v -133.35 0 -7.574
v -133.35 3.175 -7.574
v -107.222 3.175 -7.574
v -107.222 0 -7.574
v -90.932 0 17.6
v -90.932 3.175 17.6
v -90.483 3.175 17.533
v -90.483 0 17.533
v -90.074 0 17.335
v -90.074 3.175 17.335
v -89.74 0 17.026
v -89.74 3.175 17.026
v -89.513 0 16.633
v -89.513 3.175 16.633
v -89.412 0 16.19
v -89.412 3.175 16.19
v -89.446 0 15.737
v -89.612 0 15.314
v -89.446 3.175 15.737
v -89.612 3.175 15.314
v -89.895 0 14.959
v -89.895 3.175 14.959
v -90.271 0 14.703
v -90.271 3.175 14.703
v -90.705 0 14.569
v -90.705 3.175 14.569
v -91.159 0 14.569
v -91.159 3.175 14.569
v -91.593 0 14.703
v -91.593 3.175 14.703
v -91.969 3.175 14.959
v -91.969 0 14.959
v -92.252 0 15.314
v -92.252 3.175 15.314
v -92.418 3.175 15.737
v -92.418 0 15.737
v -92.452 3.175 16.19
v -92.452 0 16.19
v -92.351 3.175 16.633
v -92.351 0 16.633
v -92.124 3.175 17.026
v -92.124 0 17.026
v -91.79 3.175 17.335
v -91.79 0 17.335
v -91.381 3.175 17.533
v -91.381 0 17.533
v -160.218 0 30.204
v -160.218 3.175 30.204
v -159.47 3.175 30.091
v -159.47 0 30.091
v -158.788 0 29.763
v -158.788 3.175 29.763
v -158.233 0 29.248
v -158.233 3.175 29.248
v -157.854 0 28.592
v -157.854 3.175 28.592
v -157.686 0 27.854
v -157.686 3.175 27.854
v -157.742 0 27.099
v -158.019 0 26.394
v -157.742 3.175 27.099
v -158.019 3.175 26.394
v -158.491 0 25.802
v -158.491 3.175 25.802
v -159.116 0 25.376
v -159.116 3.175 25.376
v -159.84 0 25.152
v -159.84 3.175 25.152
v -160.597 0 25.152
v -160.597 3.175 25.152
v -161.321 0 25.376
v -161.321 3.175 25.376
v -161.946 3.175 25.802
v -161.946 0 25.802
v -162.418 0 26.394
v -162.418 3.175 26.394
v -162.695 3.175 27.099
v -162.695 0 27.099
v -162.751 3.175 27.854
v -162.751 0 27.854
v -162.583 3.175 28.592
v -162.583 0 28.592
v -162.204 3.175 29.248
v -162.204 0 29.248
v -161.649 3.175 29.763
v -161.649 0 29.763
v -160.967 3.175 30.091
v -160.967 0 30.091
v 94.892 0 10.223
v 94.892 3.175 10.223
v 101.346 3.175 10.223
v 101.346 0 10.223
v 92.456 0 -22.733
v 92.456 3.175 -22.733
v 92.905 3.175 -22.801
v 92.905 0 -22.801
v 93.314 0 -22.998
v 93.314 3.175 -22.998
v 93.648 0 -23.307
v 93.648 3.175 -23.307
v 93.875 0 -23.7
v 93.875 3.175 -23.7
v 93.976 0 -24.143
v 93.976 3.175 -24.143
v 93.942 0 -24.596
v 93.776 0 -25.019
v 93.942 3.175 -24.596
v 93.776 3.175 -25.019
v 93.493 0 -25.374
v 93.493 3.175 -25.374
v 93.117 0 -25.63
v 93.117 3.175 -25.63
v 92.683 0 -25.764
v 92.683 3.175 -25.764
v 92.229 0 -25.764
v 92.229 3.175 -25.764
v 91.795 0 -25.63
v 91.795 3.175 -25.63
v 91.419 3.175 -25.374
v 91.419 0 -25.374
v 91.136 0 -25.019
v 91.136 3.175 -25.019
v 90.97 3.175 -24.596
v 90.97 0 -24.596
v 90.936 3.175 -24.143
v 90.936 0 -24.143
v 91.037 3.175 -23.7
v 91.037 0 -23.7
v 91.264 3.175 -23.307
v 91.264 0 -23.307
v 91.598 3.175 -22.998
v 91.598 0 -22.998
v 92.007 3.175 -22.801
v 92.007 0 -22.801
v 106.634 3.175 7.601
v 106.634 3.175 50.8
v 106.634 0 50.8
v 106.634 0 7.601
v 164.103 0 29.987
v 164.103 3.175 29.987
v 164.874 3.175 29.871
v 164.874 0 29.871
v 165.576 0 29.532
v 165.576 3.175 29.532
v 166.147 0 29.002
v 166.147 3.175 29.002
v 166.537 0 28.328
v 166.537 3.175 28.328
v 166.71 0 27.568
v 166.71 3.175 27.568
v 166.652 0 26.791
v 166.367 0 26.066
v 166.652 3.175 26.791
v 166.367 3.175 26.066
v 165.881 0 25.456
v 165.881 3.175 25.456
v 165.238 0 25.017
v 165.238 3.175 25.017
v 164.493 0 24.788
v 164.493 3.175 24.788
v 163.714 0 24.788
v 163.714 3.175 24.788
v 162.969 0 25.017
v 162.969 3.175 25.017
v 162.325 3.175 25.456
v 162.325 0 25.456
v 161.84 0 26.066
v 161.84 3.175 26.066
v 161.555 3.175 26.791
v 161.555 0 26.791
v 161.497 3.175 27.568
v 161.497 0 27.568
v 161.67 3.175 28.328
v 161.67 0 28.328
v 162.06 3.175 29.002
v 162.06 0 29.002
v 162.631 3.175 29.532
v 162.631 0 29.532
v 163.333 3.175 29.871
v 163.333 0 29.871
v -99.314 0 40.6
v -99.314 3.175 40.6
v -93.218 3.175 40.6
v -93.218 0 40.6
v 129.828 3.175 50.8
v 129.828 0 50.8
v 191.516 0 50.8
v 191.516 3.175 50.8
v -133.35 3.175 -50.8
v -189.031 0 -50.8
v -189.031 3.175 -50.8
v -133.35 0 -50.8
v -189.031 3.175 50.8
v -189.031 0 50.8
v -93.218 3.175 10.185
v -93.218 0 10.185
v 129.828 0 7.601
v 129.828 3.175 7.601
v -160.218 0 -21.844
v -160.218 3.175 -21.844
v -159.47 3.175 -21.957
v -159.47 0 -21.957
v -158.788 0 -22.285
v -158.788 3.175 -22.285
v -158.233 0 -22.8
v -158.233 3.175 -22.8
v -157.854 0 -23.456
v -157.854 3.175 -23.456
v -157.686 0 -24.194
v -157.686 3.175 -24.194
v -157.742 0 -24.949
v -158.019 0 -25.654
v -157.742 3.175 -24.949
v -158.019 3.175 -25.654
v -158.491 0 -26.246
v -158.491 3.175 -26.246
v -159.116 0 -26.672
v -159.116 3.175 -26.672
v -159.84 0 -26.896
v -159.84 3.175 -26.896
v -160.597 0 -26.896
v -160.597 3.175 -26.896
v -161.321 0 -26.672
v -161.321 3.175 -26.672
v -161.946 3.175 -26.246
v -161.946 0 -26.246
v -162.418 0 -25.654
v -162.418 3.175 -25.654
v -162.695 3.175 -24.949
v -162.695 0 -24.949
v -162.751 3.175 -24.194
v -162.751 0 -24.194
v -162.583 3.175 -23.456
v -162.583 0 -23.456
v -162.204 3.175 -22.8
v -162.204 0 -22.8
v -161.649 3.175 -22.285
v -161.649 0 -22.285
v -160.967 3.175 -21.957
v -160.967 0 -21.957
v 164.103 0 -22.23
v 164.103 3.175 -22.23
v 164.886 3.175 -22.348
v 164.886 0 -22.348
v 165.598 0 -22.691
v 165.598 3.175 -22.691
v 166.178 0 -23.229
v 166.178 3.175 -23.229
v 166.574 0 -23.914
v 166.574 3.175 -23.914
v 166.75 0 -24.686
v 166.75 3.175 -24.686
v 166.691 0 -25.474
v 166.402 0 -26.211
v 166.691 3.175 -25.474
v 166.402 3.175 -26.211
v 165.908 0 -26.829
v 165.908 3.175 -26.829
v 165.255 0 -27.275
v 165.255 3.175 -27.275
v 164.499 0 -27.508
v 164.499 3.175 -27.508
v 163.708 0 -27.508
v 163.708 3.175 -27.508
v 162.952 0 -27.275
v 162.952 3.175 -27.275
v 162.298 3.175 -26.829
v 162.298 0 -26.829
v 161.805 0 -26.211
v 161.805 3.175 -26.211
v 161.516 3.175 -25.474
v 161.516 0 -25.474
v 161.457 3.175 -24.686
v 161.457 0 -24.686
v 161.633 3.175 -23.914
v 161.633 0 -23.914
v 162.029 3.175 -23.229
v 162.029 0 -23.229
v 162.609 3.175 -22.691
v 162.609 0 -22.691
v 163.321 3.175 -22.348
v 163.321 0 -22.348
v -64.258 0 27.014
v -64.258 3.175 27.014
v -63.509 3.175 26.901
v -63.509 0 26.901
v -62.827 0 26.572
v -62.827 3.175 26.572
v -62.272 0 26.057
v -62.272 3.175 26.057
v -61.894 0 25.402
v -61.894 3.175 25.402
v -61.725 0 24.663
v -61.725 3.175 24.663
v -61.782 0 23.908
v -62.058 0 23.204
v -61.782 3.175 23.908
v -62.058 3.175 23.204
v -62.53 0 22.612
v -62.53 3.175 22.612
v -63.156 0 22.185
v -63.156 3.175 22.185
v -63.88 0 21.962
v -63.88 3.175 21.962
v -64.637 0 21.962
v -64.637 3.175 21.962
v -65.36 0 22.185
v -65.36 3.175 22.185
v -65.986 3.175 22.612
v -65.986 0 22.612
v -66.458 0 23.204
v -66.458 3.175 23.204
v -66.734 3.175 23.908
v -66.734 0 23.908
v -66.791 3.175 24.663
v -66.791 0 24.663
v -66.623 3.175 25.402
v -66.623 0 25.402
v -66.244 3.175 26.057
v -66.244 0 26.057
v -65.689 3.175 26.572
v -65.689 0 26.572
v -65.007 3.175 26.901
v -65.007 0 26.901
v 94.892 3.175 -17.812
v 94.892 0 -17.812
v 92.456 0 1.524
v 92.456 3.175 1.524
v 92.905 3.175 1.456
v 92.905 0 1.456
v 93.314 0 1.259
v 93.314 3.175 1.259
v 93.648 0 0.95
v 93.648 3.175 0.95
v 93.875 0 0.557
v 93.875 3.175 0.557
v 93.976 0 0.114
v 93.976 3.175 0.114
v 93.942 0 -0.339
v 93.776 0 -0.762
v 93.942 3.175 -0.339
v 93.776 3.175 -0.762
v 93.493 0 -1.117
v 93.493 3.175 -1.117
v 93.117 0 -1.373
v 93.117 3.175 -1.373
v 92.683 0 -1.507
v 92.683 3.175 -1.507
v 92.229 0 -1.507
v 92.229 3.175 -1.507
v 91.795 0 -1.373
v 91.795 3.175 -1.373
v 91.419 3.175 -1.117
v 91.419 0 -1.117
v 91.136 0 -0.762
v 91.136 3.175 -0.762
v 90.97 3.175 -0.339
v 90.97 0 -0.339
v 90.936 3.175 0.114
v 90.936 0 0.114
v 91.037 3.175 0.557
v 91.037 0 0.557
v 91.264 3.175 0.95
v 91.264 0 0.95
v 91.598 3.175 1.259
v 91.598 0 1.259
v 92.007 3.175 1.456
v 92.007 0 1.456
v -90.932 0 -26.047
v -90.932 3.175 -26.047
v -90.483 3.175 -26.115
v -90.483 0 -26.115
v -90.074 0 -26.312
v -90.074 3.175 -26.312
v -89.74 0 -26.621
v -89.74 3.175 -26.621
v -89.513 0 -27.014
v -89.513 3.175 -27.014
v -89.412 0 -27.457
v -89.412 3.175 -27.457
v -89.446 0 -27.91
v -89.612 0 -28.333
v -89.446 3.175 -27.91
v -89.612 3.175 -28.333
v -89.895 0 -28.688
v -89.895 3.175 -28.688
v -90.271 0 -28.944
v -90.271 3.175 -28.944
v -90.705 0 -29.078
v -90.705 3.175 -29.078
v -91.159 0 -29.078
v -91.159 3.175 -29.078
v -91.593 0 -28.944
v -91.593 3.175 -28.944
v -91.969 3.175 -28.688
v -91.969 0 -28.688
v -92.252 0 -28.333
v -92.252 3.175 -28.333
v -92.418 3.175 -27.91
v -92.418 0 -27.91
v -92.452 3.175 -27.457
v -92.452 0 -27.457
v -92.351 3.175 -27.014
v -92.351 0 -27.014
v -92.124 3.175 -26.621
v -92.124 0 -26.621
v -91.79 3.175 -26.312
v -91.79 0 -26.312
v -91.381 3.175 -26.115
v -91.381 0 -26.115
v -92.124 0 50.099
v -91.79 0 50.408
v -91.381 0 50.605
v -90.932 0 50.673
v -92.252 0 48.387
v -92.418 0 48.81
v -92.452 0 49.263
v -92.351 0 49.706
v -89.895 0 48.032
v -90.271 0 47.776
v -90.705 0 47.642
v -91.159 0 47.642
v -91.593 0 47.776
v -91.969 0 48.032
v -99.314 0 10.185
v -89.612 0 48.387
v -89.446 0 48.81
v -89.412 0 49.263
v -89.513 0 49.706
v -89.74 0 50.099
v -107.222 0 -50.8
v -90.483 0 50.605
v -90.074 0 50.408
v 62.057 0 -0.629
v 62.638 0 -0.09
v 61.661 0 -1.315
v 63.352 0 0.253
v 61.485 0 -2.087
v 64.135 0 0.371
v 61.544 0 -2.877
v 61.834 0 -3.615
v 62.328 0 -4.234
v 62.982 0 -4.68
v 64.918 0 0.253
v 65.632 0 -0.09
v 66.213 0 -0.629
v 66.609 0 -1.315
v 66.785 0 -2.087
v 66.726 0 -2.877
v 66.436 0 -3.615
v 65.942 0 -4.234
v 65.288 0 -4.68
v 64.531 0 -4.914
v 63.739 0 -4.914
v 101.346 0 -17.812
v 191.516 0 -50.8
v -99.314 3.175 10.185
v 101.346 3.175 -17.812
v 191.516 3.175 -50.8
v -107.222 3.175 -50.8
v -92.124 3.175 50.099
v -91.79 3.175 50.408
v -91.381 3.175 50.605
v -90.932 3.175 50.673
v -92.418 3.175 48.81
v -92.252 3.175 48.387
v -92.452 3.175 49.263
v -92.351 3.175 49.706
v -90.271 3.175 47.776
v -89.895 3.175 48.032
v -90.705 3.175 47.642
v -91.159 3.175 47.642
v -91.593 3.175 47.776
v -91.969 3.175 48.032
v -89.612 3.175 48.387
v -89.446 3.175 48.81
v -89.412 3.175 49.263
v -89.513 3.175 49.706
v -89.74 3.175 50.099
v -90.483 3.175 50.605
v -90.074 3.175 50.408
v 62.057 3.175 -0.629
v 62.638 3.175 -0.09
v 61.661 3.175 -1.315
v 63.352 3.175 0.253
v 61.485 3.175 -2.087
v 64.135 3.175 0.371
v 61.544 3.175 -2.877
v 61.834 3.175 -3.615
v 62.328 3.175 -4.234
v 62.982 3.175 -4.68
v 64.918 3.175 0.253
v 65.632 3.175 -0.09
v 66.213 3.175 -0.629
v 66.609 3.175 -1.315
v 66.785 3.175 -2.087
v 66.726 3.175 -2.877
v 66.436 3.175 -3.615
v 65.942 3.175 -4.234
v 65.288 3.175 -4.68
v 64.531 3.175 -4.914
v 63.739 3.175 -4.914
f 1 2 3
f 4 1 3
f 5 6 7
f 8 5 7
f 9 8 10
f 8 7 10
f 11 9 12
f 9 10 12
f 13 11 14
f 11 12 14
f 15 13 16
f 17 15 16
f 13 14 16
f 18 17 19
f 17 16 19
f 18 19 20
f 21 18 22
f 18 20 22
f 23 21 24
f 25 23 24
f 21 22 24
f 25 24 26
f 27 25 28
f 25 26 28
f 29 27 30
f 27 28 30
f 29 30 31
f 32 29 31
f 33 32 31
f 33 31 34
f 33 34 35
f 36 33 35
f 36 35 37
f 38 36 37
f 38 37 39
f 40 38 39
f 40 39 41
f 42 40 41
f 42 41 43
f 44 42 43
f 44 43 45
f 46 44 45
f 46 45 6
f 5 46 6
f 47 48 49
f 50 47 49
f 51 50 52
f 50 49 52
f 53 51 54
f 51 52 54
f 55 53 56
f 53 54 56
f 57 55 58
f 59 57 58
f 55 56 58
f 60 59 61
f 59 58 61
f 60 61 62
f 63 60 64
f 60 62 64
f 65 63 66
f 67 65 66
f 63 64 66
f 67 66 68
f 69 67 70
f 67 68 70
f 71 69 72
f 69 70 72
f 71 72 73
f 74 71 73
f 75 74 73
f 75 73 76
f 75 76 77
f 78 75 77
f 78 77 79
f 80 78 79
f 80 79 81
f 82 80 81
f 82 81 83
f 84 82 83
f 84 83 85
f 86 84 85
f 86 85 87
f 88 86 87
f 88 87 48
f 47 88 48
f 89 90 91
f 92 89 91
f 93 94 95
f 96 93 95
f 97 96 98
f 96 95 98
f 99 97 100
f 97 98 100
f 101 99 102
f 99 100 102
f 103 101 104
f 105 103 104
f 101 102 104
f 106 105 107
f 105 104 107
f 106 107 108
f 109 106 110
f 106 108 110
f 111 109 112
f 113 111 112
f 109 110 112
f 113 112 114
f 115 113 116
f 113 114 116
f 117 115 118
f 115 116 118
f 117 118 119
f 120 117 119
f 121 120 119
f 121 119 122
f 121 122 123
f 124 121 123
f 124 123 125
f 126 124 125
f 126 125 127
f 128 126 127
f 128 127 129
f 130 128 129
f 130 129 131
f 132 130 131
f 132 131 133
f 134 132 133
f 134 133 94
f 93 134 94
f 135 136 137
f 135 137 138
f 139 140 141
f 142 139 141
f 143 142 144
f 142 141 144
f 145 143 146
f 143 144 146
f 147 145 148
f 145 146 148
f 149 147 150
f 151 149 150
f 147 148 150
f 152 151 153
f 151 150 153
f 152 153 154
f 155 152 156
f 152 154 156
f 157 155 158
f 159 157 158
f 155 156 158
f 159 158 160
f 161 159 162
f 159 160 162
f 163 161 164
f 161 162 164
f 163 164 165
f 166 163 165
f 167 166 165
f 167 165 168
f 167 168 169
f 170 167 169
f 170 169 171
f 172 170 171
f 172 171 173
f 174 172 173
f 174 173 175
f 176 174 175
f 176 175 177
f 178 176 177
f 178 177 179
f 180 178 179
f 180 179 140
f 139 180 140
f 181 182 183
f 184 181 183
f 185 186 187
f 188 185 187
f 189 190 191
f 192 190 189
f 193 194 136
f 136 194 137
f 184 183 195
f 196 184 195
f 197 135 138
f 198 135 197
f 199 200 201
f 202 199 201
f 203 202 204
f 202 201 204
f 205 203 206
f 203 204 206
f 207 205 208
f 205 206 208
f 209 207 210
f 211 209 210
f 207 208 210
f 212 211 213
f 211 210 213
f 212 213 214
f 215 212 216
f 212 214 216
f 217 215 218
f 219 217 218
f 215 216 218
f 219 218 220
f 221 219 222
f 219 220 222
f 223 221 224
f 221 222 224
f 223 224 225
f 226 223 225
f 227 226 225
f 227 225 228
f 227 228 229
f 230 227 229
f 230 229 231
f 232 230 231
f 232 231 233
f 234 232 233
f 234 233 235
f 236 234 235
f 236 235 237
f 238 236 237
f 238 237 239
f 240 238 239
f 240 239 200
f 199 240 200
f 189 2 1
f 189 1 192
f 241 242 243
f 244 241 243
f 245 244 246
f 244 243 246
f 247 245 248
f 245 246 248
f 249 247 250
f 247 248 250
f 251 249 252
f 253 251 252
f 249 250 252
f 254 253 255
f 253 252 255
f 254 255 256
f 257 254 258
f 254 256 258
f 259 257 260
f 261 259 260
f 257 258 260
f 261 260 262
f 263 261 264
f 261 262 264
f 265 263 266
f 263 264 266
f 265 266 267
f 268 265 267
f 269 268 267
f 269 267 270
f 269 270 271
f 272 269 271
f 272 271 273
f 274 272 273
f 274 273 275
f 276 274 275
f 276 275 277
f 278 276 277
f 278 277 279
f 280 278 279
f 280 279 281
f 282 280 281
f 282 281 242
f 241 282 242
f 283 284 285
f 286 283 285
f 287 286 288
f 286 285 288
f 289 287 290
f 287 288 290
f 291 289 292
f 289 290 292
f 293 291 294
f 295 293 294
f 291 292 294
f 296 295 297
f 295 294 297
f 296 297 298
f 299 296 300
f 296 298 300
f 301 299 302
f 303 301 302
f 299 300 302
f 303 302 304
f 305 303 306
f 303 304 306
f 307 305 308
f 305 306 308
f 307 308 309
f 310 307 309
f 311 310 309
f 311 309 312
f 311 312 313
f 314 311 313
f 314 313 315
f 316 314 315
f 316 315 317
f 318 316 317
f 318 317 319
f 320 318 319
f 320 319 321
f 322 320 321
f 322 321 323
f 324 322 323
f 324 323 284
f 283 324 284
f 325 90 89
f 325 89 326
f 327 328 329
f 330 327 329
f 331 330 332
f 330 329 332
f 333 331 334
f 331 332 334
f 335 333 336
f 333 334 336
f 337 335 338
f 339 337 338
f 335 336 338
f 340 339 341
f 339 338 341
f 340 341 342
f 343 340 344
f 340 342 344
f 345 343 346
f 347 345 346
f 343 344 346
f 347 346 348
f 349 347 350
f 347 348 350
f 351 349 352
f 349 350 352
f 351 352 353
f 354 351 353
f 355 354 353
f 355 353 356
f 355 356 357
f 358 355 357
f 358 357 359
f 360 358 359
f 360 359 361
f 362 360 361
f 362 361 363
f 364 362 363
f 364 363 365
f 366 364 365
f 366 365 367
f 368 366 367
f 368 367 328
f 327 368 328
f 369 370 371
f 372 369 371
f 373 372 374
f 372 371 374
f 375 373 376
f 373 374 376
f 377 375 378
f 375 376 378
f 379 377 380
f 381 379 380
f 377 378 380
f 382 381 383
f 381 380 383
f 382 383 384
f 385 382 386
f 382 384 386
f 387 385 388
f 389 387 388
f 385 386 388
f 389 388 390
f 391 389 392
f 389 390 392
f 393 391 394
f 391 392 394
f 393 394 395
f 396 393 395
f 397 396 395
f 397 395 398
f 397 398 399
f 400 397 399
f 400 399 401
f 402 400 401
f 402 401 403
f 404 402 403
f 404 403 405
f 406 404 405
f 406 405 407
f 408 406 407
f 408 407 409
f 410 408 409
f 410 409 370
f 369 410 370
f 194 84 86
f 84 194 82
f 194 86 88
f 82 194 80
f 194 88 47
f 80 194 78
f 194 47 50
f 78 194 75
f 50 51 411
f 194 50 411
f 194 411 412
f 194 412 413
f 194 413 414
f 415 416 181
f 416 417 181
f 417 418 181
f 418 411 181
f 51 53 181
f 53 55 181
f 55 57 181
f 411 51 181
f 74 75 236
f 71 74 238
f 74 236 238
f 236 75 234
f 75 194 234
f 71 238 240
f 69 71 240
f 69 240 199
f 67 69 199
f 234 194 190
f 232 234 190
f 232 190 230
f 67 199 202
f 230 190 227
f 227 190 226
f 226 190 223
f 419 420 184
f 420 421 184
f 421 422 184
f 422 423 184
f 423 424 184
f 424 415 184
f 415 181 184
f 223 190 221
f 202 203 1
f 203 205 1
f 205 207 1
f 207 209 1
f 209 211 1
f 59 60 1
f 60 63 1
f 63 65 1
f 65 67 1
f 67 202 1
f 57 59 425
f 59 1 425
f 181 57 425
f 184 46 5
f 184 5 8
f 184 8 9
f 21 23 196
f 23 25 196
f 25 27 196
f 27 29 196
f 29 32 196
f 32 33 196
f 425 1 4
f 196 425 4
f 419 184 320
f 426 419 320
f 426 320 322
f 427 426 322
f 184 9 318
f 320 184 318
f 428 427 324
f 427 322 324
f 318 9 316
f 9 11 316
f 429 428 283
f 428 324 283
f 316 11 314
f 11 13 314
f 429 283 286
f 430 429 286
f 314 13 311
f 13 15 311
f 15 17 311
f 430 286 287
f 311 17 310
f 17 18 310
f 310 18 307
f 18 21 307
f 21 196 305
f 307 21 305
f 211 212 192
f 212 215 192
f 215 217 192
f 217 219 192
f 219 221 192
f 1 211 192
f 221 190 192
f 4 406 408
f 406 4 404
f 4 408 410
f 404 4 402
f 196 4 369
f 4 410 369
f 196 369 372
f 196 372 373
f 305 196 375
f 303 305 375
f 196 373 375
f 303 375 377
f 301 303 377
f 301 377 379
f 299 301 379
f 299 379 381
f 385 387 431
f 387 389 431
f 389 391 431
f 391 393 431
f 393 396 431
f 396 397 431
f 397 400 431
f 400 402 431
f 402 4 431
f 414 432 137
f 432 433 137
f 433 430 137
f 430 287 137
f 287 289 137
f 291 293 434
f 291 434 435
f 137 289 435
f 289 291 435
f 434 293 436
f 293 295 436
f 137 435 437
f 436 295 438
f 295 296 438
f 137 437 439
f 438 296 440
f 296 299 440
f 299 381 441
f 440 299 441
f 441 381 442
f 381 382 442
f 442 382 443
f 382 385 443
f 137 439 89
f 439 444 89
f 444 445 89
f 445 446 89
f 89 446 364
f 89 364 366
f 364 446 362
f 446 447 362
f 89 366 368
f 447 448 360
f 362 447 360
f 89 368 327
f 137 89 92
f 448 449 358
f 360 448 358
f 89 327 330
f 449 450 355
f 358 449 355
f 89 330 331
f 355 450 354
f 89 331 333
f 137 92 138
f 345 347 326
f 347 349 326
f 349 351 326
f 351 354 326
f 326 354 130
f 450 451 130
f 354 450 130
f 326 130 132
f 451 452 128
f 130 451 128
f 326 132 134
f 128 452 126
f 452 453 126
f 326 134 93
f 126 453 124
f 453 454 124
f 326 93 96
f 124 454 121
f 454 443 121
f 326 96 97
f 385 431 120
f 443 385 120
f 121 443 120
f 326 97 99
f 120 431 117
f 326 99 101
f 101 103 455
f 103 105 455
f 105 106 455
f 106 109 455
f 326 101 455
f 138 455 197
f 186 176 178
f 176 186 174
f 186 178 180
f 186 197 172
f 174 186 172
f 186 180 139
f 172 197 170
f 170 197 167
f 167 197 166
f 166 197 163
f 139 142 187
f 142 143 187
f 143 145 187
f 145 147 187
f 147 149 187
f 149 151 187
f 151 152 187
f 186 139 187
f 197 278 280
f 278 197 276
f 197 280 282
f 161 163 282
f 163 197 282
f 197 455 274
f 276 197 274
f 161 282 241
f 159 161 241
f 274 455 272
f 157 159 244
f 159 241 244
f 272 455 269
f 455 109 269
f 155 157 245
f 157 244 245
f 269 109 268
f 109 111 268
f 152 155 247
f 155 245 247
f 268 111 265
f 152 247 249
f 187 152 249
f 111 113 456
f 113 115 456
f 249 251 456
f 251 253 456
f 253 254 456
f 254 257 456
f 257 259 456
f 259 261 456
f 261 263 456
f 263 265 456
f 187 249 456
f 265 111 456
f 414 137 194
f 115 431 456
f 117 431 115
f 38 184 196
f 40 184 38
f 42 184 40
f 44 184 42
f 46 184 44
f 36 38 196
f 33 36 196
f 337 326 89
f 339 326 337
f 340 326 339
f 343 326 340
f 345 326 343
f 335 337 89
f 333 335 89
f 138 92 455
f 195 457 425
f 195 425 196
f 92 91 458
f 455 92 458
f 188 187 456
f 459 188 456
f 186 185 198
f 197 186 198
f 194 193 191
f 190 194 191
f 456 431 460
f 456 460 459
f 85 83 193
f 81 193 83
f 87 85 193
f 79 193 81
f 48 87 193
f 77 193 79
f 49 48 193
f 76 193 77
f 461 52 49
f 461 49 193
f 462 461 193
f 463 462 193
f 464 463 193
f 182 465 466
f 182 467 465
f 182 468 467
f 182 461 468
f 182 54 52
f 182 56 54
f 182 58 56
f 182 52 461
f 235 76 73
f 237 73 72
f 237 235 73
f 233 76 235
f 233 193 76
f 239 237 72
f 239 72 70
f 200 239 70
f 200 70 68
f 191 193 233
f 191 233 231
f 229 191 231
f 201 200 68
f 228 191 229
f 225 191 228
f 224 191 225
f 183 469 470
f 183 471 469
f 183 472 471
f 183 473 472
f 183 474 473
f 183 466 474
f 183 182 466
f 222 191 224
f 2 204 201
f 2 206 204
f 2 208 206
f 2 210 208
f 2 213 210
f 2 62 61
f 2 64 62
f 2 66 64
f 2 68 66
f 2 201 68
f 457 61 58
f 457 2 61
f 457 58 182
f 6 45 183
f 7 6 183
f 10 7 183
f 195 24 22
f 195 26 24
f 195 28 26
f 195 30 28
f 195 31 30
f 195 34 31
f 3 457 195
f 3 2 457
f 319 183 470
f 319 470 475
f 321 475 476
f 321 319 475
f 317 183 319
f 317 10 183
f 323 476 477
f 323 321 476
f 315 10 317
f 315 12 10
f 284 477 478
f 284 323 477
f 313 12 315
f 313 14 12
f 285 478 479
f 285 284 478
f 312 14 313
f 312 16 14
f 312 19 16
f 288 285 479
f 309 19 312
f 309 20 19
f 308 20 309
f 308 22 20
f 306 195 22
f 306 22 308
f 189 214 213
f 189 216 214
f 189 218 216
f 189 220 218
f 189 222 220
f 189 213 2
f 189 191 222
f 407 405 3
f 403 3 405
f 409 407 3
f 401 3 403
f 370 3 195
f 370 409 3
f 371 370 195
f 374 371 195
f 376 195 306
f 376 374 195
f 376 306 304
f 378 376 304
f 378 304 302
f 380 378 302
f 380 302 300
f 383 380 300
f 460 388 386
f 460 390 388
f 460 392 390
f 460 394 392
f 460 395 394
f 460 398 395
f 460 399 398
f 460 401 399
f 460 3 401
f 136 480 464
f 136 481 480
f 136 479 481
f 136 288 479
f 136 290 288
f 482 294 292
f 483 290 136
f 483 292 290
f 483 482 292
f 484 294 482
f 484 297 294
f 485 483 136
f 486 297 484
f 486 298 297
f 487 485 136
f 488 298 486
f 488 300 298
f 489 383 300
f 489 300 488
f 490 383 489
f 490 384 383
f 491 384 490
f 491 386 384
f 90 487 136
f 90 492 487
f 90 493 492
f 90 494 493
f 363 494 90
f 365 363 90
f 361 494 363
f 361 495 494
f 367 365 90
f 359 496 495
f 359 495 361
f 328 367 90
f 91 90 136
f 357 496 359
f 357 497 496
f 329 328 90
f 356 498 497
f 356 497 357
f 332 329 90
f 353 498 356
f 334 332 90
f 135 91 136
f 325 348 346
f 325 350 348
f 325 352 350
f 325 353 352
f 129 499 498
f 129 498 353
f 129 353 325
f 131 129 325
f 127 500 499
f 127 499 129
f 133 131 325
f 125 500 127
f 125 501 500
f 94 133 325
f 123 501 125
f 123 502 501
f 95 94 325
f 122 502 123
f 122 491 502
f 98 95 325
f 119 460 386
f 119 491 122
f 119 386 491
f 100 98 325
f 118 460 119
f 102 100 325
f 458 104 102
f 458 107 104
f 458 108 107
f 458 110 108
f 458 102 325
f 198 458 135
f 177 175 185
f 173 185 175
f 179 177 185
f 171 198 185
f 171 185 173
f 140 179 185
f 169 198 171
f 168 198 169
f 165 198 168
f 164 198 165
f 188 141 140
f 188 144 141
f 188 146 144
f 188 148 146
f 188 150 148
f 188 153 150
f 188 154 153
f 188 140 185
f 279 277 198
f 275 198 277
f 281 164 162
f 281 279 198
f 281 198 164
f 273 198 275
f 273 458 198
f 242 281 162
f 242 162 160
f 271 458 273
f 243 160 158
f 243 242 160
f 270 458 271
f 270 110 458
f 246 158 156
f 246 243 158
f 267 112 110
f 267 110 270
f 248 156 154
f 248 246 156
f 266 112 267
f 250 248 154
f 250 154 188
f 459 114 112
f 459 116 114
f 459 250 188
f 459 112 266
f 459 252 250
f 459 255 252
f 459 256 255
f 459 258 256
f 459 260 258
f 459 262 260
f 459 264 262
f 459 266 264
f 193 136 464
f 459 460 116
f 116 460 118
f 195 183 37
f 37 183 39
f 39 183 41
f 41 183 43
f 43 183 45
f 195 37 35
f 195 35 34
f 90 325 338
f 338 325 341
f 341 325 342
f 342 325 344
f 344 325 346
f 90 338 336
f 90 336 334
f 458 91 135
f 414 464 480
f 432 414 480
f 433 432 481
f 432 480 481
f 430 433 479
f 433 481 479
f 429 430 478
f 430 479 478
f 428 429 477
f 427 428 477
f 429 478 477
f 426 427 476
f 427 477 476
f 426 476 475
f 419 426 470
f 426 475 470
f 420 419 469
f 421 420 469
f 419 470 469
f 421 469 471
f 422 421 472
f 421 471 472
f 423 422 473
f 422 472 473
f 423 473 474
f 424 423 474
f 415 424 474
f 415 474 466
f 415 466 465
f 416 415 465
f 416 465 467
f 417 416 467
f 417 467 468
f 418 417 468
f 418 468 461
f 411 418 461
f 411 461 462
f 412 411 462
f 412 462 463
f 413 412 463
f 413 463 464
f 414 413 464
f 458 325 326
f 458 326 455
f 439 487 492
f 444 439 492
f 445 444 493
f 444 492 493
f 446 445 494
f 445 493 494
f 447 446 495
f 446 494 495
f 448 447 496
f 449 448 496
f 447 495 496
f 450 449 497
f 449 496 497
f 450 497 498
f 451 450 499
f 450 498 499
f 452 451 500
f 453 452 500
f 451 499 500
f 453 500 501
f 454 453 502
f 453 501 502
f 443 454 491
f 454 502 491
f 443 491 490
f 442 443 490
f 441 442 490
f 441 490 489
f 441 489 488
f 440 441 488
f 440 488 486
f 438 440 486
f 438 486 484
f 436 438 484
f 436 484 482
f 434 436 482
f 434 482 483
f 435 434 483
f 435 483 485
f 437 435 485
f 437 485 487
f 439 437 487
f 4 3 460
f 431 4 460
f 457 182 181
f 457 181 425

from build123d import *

# Parameters (mm, degrees)
SKETCH2_W           = 383.032
SKETCH2_H           = 101.6
BOSS_EXTRUDE1_DEPTH = 3.175
SKETCH3_R           = 2.54
SKETCH3_R_2         = 1.524
SKETCH3_W           = 26.128243683
SKETCH3_H           = 43.225676532
SKETCH3_W_2         = 6.096
SKETCH3_H_2         = 30.414908662
CUT_EXTRUDE1_DEPTH  = 5.08
SKETCH4_W           = 23.194024084
SKETCH4_H           = 43.199369669
SKETCH4_W_2         = 6.45398931
SKETCH4_H_2         = 28.034516067
SKETCH4_R           = 2.653649749
SKETCH4_R_2         = 2.61409985
SKETCH4_R_3         = 2.657297928
SKETCH4_R_4         = 1.524
CUT_EXTRUDE2_DEPTH  = 5.08
SKETCH5_W           = 11.780939099
SKETCH5_H           = 116.381398369
CUT_EXTRUDE3_DEPTH  = 6.35


with BuildPart() as part:
    # Sketch2 → Boss-Extrude1 (new body)
    with BuildSketch(Plane(origin=(0, 0, 0), x_dir=(1, 0, 0), z_dir=(0, 1, 0))):
        Rectangle(SKETCH2_W, SKETCH2_H)
    extrude(amount=BOSS_EXTRUDE1_DEPTH)

    # Sketch3 → Cut-Extrude1 (cut)
    with BuildSketch(Plane(origin=(0, 3.175, 0), x_dir=(1, 0, 0), z_dir=(0, 1, 0))):
        with Locations(Location((-160.218440268, 24.384, 0), (0, 0, 270))):
            Circle(SKETCH3_R)
        with Locations(Location((-160.218440268, -27.664005213, 0), (0, 0, 270))):
            Circle(SKETCH3_R)
        with Locations(Location((-90.932, -49.149, 0), (0, 0, 270))):
            Circle(SKETCH3_R_2)
        with Locations(Location((-90.932, -16.076263173, 0), (0, 0, 270))):
            Circle(SKETCH3_R_2)
        with Locations(Location((-90.932, 27.570881088, 0), (0, 0, 270))):
            Circle(SKETCH3_R_2)
        with Locations(Location((-64.2581016, -24.473600424, 0), (0, 0, 270))):
            Circle(SKETCH3_R)
        with Locations((-120.285878158, 29.187161734)):
            Rectangle(SKETCH3_W, SKETCH3_H)
        with Locations((-96.266, -25.392171491)):
            Rectangle(SKETCH3_W_2, SKETCH3_H_2)
    extrude(amount=-CUT_EXTRUDE1_DEPTH, mode=Mode.SUBTRACT)

    # Sketch4 → Cut-Extrude2 (cut)
    with BuildSketch(Plane(origin=(0, 3.175, 0), x_dir=(1, 0, 0), z_dir=(0, 1, 0))):
        with Locations((118.230976638, -29.200315166)):
            Rectangle(SKETCH4_W, SKETCH4_H)
        with Locations((98.119005345, 3.794694545)):
            Rectangle(SKETCH4_W_2, SKETCH4_H_2)
        with Locations(Location((164.103401606, 24.883919413, 0), (0, 0, 270))):
            Circle(SKETCH4_R)
        with Locations(Location((164.103401606, -27.372567953, 0), (0, 0, 270))):
            Circle(SKETCH4_R_2)
        with Locations(Location((64.135, 2.286, 0), (0, 0, 270))):
            Circle(SKETCH4_R_3)
        with Locations(Location((92.456, 24.257, 0), (0, 0, 270))):
            Circle(SKETCH4_R_4)
        with Locations(Location((92.456, 0, 0), (0, 0, 270))):
            Circle(SKETCH4_R_4)
    extrude(amount=-CUT_EXTRUDE2_DEPTH, mode=Mode.SUBTRACT)

    # Sketch5 → Cut-Extrude3 (cut)
    with BuildSketch(Plane(origin=(0, 3.175, 0), x_dir=(1, 0, 0), z_dir=(0, 1, 0))):
        with Locations((-194.920992361, 1.96348985)):
            Rectangle(SKETCH5_W, SKETCH5_H)
    extrude(amount=-CUT_EXTRUDE3_DEPTH, mode=Mode.SUBTRACT)


solid = part.part
